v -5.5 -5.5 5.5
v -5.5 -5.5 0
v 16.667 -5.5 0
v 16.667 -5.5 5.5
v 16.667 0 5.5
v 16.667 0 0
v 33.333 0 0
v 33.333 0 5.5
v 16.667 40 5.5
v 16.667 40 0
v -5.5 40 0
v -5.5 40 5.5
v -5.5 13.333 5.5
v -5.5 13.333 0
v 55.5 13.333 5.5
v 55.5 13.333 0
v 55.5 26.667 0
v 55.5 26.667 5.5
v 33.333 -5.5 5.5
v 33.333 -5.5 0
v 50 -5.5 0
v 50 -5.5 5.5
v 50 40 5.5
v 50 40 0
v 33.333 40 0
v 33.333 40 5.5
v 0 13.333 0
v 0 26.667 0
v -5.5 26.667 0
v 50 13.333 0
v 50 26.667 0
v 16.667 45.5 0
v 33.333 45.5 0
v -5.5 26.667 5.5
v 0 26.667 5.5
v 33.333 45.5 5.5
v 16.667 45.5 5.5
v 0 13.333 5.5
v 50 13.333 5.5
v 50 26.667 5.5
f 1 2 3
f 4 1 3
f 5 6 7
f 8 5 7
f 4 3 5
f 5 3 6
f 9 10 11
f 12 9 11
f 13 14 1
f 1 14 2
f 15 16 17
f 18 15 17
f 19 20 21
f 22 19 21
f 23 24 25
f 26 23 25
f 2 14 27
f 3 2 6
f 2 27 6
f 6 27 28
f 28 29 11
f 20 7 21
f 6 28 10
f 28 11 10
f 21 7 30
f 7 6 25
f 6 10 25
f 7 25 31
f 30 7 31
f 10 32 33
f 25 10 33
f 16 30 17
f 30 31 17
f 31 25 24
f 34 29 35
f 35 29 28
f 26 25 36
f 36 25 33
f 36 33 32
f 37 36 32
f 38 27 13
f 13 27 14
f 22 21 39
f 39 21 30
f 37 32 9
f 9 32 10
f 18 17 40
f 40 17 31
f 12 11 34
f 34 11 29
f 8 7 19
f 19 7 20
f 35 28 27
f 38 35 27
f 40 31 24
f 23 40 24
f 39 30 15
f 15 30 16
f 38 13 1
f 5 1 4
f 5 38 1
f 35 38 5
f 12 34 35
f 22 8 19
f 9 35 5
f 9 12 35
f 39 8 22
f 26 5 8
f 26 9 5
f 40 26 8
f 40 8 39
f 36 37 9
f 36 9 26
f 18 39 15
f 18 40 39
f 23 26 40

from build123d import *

# Parameters (mm, degrees)
BOSS_EXTRUDE1_DEPTH = 5.5


with BuildPart() as part:
    # Sketch1 → Boss-Extrude1 (new body)
    with BuildSketch(Plane.XY):
        Polygon((16.666666667, 0), (33.333333333, 0), (33.333333333, -5.5), (50, -5.5), (50, 0), (50, 13.333333333), (55.5, 13.333333333), (55.5, 26.666666667), (50, 26.666666667), (50, 40), (33.333333333, 40), (33.333333333, 45.5), (16.666666667, 45.5), (16.666666667, 40), (0, 40), (-5.5, 40), (-5.5, 26.666666667), (0, 26.666666667), (0, 13.333333333), (-5.5, 13.333333333), (-5.5, -5.5), (0, -5.5), (16.666666667, -5.5), align=None)
    extrude(amount=BOSS_EXTRUDE1_DEPTH)


solid = part.part
